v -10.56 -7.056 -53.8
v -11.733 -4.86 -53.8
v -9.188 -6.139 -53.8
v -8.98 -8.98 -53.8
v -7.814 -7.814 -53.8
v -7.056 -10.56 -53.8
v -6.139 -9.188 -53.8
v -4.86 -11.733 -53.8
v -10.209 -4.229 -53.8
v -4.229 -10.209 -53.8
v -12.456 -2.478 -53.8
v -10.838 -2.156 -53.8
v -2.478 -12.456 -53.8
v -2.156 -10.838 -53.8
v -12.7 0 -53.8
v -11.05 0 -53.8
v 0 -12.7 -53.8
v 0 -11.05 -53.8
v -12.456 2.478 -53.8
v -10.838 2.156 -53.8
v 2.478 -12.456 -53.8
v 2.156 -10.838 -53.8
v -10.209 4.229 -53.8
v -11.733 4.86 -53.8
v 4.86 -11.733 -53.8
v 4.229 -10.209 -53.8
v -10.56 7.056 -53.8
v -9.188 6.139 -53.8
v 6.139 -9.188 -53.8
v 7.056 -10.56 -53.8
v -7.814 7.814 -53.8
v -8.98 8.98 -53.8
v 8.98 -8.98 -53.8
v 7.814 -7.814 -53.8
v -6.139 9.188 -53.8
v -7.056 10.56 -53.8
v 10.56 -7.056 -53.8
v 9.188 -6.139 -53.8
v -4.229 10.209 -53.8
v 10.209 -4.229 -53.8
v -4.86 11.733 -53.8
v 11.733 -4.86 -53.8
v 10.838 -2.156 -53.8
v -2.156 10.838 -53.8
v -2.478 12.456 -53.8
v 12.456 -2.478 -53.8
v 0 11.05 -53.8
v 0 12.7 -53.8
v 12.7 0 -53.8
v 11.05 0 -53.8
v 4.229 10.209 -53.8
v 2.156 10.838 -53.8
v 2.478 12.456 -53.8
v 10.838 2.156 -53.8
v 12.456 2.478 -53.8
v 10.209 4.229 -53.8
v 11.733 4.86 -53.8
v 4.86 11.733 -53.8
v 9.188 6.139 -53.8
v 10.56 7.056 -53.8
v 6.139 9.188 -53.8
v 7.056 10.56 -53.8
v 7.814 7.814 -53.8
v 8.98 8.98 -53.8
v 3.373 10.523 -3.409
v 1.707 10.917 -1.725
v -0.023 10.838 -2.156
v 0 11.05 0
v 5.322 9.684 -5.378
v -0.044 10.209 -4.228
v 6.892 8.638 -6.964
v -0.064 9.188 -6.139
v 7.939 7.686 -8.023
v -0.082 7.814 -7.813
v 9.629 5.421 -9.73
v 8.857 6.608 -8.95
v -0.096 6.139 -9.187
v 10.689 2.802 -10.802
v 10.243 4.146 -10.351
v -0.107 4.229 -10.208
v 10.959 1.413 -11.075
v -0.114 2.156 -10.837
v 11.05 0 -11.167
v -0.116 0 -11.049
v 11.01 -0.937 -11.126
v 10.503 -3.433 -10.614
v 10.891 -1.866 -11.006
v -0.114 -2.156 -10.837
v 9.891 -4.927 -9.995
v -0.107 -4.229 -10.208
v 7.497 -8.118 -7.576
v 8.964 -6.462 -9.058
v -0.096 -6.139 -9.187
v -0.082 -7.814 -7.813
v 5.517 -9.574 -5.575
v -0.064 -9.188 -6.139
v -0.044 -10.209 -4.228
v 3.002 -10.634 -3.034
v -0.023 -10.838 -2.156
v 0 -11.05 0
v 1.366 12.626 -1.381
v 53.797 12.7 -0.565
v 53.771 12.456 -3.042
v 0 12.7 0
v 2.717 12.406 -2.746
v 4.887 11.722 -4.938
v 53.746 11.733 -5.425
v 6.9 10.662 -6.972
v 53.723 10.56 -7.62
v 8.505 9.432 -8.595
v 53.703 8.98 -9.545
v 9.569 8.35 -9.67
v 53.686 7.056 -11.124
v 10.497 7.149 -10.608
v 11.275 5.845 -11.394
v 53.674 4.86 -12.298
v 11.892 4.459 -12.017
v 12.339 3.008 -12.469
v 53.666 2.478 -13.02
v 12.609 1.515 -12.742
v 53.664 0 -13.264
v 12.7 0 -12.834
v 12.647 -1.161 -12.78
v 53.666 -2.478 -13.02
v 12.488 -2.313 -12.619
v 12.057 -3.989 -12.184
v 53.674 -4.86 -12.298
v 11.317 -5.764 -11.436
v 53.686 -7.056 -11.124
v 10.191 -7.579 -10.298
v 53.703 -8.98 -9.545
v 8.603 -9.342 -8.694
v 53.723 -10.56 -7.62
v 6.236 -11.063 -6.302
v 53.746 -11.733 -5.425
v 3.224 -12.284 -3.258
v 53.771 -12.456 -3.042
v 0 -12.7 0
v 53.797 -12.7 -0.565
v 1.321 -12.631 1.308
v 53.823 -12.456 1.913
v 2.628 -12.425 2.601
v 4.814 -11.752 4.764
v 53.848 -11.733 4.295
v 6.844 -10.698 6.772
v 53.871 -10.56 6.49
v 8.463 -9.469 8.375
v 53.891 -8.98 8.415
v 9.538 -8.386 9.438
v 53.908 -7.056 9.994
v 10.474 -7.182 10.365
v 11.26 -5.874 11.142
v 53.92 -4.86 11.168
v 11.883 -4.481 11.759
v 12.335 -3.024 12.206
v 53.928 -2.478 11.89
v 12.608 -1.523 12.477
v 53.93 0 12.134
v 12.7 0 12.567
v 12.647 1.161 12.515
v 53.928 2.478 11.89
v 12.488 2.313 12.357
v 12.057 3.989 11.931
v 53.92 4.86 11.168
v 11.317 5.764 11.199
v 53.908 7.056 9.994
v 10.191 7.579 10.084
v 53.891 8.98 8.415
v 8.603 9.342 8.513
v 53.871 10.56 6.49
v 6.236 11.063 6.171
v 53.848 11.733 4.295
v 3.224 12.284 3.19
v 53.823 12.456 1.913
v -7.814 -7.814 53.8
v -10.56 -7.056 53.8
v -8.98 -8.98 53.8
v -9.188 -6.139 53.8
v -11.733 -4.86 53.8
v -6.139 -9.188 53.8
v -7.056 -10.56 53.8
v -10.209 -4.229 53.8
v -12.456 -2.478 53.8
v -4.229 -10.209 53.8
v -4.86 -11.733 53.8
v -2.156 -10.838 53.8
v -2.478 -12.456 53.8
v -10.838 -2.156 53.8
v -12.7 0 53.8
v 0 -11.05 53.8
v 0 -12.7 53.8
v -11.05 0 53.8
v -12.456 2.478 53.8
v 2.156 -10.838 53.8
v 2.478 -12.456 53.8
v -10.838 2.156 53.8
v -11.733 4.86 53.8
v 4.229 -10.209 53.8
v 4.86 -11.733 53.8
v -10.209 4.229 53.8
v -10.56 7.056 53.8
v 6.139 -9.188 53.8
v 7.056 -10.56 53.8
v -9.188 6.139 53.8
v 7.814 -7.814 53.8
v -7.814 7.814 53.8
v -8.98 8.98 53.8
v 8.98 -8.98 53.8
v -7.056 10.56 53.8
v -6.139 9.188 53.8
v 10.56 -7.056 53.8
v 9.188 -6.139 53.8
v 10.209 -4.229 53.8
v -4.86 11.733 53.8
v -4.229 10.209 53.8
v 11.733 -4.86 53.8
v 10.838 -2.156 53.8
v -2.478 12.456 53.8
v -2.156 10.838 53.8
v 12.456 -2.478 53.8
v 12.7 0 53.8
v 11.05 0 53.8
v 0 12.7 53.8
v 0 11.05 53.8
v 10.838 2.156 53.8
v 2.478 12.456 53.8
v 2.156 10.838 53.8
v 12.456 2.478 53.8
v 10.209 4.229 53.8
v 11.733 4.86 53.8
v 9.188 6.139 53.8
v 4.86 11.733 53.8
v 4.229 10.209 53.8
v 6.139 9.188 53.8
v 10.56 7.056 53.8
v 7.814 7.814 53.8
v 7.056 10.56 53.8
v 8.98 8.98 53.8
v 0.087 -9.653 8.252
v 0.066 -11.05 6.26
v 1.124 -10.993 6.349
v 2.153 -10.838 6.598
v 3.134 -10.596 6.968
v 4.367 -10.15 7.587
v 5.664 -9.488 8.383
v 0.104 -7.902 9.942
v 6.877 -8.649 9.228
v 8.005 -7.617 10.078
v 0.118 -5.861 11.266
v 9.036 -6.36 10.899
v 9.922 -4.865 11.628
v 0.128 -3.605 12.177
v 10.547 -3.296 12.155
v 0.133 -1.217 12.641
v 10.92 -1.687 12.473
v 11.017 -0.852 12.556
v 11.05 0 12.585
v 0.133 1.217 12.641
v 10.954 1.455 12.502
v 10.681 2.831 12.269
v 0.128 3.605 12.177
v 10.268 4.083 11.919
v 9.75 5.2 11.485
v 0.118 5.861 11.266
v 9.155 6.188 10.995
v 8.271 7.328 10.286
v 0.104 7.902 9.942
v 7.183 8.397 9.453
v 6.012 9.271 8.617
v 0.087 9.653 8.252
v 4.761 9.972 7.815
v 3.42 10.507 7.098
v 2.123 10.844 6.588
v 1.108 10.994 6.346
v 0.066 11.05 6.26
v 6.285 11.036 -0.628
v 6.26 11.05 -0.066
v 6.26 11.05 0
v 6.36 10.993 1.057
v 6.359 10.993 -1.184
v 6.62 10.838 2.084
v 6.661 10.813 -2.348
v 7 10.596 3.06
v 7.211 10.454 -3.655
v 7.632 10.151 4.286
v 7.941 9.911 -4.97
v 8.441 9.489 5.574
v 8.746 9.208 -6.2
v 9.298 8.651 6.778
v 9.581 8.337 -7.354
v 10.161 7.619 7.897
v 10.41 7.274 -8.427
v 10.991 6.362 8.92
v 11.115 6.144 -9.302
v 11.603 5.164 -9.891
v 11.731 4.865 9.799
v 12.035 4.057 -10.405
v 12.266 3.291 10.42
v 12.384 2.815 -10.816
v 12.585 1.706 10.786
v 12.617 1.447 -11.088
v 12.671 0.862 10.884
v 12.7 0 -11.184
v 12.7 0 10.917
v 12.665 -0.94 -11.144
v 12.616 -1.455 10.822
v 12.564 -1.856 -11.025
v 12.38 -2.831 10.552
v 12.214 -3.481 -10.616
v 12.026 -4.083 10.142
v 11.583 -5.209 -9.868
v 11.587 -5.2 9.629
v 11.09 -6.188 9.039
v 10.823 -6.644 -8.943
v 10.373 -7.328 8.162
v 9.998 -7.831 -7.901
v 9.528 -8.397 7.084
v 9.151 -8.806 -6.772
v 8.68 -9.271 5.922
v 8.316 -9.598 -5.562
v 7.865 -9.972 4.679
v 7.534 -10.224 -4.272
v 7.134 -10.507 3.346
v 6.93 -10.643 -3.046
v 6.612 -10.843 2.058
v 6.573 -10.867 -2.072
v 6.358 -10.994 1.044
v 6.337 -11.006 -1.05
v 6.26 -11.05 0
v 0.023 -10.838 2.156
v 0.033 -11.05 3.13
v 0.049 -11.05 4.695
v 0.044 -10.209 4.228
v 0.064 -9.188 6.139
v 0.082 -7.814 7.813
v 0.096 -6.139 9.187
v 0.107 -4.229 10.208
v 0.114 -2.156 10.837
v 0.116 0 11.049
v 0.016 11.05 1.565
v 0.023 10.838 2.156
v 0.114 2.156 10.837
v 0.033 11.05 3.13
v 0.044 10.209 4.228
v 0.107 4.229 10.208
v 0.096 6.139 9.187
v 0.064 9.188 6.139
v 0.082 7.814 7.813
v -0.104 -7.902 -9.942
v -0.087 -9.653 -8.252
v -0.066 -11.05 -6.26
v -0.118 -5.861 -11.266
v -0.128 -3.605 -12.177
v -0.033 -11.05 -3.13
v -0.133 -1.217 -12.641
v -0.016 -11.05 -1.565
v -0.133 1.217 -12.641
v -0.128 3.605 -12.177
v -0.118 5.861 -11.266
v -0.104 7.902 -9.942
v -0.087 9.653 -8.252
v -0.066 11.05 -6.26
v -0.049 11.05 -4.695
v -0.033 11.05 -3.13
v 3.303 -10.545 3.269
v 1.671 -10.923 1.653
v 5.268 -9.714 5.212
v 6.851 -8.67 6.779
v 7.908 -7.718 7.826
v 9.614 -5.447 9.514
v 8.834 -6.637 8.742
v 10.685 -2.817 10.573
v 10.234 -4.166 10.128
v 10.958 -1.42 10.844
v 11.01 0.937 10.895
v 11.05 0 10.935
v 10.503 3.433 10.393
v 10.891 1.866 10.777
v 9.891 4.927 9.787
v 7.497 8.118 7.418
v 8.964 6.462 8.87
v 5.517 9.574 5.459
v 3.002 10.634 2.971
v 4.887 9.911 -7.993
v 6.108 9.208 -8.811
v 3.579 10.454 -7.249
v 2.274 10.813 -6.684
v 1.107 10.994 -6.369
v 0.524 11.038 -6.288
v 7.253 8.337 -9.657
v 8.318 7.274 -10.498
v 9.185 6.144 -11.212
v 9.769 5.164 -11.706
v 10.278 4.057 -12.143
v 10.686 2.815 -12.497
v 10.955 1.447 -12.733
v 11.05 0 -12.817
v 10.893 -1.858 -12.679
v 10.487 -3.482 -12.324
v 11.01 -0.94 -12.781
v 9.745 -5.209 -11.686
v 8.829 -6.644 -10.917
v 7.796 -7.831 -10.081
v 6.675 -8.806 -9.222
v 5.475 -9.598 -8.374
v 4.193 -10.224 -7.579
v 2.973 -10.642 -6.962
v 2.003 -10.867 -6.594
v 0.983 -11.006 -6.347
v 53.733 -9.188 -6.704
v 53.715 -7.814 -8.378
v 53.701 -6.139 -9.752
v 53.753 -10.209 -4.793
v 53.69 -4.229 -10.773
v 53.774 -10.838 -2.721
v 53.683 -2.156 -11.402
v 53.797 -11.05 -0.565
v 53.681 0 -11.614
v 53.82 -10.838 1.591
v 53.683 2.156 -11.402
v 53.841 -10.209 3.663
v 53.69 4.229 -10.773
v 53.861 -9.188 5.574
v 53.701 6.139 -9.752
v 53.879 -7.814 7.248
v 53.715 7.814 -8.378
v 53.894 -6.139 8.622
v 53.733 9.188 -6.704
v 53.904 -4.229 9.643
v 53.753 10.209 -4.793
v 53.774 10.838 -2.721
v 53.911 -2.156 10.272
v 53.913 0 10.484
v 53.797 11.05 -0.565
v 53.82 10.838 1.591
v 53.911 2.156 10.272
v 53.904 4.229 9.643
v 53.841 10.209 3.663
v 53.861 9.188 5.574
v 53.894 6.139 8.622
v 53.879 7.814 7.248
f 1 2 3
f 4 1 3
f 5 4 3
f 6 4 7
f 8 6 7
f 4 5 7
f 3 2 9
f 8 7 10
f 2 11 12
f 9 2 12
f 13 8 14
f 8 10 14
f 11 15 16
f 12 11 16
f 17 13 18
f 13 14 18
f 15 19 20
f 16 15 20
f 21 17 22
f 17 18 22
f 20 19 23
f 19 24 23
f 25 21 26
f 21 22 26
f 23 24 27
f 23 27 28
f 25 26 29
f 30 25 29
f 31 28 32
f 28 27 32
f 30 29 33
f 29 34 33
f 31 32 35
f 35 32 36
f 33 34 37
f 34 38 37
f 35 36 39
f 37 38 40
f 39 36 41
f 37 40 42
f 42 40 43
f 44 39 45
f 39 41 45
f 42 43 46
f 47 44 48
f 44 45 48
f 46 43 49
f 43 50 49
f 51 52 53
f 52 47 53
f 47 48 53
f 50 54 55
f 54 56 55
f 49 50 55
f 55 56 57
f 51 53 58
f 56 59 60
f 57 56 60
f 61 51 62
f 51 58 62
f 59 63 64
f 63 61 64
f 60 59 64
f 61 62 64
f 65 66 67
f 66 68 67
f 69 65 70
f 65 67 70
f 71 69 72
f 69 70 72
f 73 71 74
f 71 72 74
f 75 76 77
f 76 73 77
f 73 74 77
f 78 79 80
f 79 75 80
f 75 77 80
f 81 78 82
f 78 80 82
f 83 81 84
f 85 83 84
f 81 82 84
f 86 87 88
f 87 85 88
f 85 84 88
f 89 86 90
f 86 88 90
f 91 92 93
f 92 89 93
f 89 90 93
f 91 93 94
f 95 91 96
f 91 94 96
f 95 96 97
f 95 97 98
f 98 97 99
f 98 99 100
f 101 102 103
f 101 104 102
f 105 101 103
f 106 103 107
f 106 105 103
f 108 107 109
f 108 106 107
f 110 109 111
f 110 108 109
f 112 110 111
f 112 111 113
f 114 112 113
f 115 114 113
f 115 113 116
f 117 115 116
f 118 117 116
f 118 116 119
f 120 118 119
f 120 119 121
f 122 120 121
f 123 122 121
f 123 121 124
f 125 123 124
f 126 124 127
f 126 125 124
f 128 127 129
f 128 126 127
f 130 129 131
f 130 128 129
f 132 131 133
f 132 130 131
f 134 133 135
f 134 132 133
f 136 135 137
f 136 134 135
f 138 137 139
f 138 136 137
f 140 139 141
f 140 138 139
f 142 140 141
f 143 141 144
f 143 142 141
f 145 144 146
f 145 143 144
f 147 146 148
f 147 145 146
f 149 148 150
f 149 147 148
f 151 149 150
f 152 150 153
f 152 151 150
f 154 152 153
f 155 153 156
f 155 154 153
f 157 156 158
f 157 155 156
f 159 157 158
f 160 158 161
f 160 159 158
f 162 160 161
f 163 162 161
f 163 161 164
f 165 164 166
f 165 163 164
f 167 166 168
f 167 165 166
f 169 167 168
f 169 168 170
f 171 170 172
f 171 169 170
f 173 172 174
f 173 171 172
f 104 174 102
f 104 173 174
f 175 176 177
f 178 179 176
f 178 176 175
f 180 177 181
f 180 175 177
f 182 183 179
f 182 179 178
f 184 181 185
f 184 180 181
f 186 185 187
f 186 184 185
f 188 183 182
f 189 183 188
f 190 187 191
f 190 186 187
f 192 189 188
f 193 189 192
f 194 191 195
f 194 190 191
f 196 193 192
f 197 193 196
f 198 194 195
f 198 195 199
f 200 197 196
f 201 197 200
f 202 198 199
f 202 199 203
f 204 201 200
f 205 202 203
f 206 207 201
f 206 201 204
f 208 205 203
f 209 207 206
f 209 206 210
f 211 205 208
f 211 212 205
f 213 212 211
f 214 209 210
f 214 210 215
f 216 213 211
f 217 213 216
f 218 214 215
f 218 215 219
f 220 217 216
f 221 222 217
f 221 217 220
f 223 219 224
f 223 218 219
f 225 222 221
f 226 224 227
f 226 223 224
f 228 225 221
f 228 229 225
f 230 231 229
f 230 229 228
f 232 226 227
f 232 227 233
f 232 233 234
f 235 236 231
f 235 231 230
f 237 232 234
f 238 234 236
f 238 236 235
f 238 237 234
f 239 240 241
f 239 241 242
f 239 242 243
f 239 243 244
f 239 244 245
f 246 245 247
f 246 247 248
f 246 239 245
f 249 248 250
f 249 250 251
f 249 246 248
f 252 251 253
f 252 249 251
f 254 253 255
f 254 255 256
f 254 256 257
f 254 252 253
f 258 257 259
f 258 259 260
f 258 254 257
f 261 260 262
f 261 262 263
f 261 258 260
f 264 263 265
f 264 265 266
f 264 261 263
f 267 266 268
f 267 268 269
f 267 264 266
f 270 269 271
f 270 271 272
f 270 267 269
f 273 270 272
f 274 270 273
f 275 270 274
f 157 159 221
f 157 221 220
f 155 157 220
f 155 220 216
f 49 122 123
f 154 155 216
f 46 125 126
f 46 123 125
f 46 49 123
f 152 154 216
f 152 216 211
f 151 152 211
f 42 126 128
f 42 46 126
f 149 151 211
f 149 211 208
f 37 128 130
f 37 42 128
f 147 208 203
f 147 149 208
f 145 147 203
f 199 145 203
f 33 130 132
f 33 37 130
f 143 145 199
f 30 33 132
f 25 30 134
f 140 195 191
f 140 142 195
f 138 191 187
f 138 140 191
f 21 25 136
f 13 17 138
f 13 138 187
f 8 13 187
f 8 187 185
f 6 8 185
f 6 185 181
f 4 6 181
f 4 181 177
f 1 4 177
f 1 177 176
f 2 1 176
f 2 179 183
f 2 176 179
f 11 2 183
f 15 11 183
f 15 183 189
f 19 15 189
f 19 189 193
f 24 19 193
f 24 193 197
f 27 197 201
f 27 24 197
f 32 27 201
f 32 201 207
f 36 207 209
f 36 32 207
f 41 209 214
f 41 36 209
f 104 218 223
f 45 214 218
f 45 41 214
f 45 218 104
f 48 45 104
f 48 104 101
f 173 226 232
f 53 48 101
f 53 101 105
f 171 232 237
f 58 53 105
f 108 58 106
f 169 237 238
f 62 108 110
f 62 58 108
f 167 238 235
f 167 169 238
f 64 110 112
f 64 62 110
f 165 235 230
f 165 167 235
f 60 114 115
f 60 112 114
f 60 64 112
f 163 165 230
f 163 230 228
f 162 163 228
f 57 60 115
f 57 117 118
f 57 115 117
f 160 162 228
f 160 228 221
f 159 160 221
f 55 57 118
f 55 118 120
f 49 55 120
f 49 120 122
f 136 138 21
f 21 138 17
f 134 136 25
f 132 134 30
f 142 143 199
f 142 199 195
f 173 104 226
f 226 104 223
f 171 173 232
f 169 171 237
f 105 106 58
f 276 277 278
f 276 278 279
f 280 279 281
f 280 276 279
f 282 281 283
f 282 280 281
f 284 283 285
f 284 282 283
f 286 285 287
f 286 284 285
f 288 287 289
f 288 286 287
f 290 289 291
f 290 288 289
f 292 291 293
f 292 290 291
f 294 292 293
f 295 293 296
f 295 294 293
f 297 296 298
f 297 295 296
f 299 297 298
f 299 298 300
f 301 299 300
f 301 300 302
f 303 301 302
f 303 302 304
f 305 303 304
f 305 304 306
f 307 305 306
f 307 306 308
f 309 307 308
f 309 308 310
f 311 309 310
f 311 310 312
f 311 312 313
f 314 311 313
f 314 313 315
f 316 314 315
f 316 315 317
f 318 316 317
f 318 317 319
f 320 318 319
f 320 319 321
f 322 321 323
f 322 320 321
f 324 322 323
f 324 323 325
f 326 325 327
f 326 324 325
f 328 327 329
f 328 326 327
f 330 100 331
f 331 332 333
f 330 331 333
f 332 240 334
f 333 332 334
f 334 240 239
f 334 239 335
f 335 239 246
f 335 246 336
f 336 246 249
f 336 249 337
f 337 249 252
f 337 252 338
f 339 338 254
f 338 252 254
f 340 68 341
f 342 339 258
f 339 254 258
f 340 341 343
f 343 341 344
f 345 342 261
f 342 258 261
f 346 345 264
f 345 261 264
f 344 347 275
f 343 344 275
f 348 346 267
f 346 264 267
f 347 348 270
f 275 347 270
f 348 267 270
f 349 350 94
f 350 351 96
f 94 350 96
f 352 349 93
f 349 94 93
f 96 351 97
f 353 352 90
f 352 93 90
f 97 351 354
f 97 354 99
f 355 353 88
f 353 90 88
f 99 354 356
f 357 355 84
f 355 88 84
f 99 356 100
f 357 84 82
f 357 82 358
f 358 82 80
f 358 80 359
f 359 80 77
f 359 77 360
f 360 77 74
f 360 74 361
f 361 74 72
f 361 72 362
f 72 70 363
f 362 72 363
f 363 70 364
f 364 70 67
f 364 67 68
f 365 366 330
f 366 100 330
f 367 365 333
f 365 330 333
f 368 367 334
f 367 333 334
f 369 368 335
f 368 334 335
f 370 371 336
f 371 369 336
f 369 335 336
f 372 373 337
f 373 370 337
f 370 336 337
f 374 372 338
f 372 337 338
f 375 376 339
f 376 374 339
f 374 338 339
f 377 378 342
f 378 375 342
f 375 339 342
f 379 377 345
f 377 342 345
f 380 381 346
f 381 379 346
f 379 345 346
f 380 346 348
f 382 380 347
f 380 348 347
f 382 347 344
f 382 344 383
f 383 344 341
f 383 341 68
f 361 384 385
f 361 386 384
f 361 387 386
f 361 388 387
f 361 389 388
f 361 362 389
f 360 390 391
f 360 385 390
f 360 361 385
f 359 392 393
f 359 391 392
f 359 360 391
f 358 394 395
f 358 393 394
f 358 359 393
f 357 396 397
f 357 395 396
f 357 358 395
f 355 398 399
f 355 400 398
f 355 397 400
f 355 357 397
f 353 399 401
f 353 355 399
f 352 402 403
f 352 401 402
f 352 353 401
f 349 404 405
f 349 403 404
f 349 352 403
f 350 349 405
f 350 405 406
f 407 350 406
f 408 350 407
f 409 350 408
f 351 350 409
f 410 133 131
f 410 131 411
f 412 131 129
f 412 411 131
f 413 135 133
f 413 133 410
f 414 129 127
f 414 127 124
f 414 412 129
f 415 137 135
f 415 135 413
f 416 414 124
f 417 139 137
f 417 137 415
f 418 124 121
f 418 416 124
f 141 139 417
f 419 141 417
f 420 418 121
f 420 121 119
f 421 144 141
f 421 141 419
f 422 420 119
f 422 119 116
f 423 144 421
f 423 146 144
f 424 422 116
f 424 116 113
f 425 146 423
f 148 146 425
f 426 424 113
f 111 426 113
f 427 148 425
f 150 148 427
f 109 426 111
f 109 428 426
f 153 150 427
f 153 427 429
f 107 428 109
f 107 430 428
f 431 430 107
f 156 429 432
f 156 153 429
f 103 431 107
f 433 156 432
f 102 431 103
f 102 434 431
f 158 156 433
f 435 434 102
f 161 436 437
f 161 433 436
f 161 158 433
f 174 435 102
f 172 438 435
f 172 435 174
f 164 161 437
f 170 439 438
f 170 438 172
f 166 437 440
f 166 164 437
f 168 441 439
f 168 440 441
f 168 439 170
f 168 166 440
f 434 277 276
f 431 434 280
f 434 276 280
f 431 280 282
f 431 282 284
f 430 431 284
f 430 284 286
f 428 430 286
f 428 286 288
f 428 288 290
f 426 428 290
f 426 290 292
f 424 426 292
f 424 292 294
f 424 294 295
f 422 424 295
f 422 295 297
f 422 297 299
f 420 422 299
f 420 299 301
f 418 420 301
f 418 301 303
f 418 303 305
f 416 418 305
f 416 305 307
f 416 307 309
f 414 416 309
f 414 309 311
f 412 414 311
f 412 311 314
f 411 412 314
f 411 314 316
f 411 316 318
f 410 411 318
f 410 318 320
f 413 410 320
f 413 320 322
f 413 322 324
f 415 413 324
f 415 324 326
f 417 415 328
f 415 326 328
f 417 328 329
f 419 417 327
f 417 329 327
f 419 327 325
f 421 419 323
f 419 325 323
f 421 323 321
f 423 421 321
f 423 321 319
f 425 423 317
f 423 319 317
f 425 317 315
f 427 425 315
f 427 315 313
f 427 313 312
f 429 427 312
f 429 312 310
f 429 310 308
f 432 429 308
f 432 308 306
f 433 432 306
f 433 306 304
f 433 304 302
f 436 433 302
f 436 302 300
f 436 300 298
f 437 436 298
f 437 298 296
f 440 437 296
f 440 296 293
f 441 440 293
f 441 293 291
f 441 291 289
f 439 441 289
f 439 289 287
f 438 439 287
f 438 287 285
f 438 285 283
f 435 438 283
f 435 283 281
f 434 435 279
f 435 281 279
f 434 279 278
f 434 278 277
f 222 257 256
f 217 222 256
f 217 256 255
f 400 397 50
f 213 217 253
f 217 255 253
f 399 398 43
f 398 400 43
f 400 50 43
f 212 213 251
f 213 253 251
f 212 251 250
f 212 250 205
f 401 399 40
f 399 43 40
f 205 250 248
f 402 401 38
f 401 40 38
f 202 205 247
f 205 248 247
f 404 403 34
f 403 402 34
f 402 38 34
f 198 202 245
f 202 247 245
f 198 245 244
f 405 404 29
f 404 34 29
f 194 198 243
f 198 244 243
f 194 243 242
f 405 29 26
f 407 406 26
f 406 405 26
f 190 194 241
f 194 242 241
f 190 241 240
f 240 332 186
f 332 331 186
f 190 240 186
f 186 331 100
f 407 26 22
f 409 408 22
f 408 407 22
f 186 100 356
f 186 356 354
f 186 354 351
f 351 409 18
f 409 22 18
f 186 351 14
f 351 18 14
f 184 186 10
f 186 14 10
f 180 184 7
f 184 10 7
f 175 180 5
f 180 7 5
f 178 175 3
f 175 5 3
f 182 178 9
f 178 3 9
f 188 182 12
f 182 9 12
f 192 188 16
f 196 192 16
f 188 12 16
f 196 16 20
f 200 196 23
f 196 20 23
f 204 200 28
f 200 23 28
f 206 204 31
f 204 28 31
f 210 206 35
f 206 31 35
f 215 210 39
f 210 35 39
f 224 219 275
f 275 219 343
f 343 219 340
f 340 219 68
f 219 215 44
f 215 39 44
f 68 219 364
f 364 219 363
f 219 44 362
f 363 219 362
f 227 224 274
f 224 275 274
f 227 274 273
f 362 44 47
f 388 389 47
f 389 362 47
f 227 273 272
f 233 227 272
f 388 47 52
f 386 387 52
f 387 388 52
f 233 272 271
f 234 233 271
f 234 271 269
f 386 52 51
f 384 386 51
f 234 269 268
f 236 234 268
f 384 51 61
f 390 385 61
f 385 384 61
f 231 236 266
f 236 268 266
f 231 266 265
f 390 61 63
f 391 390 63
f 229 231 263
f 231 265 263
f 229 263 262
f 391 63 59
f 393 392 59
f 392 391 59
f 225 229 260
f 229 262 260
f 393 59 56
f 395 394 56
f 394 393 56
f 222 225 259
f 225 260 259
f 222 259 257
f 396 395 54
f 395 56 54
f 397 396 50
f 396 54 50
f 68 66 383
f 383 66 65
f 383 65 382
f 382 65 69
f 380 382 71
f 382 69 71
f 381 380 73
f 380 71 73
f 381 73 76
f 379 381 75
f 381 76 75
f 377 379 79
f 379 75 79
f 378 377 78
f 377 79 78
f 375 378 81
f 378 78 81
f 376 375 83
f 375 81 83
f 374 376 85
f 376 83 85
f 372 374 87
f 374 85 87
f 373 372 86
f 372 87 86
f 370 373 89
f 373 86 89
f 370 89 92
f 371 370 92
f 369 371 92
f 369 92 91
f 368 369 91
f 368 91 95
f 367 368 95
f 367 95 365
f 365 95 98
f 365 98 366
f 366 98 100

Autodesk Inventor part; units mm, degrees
ref_plane "YZ Plane" through (0, 0, 0) normal (1, 0, 0) x (0, 1, 0)
ref_plane "XZ Plane" through (0, 0, 0) normal (0, 1, 0) x (-1, 0, 0)
sketch "Sketch1" plane through (0, 0, 0) normal (0, 0, 1) x (1, 0, 0)
  circle A0 centre (0, 0) radius 12.7
  dimension "d0" = 25.4
extrude "Extrusion1" add sketch "Sketch1" along normal mid plane 107.6
shell "Shell1" thickness 1.65 removed faces 2 at (-3.6254, -0.9542, 53.8) at (-3.6254, -0.9542, -53.8)
ref_plane "Work Plane2" through (0, 0, 0) normal (0.9999, 0, -0.0105) x (0, 1, 0)
sketch "Sketch6" plane through (0, 0, 0) normal (0.9999, 0, -0.0105) x (0, 1, 0)
  ellipse E0 centre (0, -53.7971) end of major axis (-12.7, -53.7971) minor radius 0.133 projected
  ellipse E1 centre (0, 53.7971) end of major axis (12.7, 53.7971) minor radius 0.133 projected
  line L0 (0, -53.7971) -> (0, 53.7971) construction
  circle A0 centre (0, 0) radius 12.7
  circle A1 centre (0, 0) radius 11.05
  dimension "d19" = 25.4
  dimension "d20" = 1.65
extrude "Extrusion3" add sketch "Sketch6" along normal blind 53.8 contours A0
properties part number "EQ TEE (ASME BPE - 89.4 or 90.6 DEG)-25.4"
